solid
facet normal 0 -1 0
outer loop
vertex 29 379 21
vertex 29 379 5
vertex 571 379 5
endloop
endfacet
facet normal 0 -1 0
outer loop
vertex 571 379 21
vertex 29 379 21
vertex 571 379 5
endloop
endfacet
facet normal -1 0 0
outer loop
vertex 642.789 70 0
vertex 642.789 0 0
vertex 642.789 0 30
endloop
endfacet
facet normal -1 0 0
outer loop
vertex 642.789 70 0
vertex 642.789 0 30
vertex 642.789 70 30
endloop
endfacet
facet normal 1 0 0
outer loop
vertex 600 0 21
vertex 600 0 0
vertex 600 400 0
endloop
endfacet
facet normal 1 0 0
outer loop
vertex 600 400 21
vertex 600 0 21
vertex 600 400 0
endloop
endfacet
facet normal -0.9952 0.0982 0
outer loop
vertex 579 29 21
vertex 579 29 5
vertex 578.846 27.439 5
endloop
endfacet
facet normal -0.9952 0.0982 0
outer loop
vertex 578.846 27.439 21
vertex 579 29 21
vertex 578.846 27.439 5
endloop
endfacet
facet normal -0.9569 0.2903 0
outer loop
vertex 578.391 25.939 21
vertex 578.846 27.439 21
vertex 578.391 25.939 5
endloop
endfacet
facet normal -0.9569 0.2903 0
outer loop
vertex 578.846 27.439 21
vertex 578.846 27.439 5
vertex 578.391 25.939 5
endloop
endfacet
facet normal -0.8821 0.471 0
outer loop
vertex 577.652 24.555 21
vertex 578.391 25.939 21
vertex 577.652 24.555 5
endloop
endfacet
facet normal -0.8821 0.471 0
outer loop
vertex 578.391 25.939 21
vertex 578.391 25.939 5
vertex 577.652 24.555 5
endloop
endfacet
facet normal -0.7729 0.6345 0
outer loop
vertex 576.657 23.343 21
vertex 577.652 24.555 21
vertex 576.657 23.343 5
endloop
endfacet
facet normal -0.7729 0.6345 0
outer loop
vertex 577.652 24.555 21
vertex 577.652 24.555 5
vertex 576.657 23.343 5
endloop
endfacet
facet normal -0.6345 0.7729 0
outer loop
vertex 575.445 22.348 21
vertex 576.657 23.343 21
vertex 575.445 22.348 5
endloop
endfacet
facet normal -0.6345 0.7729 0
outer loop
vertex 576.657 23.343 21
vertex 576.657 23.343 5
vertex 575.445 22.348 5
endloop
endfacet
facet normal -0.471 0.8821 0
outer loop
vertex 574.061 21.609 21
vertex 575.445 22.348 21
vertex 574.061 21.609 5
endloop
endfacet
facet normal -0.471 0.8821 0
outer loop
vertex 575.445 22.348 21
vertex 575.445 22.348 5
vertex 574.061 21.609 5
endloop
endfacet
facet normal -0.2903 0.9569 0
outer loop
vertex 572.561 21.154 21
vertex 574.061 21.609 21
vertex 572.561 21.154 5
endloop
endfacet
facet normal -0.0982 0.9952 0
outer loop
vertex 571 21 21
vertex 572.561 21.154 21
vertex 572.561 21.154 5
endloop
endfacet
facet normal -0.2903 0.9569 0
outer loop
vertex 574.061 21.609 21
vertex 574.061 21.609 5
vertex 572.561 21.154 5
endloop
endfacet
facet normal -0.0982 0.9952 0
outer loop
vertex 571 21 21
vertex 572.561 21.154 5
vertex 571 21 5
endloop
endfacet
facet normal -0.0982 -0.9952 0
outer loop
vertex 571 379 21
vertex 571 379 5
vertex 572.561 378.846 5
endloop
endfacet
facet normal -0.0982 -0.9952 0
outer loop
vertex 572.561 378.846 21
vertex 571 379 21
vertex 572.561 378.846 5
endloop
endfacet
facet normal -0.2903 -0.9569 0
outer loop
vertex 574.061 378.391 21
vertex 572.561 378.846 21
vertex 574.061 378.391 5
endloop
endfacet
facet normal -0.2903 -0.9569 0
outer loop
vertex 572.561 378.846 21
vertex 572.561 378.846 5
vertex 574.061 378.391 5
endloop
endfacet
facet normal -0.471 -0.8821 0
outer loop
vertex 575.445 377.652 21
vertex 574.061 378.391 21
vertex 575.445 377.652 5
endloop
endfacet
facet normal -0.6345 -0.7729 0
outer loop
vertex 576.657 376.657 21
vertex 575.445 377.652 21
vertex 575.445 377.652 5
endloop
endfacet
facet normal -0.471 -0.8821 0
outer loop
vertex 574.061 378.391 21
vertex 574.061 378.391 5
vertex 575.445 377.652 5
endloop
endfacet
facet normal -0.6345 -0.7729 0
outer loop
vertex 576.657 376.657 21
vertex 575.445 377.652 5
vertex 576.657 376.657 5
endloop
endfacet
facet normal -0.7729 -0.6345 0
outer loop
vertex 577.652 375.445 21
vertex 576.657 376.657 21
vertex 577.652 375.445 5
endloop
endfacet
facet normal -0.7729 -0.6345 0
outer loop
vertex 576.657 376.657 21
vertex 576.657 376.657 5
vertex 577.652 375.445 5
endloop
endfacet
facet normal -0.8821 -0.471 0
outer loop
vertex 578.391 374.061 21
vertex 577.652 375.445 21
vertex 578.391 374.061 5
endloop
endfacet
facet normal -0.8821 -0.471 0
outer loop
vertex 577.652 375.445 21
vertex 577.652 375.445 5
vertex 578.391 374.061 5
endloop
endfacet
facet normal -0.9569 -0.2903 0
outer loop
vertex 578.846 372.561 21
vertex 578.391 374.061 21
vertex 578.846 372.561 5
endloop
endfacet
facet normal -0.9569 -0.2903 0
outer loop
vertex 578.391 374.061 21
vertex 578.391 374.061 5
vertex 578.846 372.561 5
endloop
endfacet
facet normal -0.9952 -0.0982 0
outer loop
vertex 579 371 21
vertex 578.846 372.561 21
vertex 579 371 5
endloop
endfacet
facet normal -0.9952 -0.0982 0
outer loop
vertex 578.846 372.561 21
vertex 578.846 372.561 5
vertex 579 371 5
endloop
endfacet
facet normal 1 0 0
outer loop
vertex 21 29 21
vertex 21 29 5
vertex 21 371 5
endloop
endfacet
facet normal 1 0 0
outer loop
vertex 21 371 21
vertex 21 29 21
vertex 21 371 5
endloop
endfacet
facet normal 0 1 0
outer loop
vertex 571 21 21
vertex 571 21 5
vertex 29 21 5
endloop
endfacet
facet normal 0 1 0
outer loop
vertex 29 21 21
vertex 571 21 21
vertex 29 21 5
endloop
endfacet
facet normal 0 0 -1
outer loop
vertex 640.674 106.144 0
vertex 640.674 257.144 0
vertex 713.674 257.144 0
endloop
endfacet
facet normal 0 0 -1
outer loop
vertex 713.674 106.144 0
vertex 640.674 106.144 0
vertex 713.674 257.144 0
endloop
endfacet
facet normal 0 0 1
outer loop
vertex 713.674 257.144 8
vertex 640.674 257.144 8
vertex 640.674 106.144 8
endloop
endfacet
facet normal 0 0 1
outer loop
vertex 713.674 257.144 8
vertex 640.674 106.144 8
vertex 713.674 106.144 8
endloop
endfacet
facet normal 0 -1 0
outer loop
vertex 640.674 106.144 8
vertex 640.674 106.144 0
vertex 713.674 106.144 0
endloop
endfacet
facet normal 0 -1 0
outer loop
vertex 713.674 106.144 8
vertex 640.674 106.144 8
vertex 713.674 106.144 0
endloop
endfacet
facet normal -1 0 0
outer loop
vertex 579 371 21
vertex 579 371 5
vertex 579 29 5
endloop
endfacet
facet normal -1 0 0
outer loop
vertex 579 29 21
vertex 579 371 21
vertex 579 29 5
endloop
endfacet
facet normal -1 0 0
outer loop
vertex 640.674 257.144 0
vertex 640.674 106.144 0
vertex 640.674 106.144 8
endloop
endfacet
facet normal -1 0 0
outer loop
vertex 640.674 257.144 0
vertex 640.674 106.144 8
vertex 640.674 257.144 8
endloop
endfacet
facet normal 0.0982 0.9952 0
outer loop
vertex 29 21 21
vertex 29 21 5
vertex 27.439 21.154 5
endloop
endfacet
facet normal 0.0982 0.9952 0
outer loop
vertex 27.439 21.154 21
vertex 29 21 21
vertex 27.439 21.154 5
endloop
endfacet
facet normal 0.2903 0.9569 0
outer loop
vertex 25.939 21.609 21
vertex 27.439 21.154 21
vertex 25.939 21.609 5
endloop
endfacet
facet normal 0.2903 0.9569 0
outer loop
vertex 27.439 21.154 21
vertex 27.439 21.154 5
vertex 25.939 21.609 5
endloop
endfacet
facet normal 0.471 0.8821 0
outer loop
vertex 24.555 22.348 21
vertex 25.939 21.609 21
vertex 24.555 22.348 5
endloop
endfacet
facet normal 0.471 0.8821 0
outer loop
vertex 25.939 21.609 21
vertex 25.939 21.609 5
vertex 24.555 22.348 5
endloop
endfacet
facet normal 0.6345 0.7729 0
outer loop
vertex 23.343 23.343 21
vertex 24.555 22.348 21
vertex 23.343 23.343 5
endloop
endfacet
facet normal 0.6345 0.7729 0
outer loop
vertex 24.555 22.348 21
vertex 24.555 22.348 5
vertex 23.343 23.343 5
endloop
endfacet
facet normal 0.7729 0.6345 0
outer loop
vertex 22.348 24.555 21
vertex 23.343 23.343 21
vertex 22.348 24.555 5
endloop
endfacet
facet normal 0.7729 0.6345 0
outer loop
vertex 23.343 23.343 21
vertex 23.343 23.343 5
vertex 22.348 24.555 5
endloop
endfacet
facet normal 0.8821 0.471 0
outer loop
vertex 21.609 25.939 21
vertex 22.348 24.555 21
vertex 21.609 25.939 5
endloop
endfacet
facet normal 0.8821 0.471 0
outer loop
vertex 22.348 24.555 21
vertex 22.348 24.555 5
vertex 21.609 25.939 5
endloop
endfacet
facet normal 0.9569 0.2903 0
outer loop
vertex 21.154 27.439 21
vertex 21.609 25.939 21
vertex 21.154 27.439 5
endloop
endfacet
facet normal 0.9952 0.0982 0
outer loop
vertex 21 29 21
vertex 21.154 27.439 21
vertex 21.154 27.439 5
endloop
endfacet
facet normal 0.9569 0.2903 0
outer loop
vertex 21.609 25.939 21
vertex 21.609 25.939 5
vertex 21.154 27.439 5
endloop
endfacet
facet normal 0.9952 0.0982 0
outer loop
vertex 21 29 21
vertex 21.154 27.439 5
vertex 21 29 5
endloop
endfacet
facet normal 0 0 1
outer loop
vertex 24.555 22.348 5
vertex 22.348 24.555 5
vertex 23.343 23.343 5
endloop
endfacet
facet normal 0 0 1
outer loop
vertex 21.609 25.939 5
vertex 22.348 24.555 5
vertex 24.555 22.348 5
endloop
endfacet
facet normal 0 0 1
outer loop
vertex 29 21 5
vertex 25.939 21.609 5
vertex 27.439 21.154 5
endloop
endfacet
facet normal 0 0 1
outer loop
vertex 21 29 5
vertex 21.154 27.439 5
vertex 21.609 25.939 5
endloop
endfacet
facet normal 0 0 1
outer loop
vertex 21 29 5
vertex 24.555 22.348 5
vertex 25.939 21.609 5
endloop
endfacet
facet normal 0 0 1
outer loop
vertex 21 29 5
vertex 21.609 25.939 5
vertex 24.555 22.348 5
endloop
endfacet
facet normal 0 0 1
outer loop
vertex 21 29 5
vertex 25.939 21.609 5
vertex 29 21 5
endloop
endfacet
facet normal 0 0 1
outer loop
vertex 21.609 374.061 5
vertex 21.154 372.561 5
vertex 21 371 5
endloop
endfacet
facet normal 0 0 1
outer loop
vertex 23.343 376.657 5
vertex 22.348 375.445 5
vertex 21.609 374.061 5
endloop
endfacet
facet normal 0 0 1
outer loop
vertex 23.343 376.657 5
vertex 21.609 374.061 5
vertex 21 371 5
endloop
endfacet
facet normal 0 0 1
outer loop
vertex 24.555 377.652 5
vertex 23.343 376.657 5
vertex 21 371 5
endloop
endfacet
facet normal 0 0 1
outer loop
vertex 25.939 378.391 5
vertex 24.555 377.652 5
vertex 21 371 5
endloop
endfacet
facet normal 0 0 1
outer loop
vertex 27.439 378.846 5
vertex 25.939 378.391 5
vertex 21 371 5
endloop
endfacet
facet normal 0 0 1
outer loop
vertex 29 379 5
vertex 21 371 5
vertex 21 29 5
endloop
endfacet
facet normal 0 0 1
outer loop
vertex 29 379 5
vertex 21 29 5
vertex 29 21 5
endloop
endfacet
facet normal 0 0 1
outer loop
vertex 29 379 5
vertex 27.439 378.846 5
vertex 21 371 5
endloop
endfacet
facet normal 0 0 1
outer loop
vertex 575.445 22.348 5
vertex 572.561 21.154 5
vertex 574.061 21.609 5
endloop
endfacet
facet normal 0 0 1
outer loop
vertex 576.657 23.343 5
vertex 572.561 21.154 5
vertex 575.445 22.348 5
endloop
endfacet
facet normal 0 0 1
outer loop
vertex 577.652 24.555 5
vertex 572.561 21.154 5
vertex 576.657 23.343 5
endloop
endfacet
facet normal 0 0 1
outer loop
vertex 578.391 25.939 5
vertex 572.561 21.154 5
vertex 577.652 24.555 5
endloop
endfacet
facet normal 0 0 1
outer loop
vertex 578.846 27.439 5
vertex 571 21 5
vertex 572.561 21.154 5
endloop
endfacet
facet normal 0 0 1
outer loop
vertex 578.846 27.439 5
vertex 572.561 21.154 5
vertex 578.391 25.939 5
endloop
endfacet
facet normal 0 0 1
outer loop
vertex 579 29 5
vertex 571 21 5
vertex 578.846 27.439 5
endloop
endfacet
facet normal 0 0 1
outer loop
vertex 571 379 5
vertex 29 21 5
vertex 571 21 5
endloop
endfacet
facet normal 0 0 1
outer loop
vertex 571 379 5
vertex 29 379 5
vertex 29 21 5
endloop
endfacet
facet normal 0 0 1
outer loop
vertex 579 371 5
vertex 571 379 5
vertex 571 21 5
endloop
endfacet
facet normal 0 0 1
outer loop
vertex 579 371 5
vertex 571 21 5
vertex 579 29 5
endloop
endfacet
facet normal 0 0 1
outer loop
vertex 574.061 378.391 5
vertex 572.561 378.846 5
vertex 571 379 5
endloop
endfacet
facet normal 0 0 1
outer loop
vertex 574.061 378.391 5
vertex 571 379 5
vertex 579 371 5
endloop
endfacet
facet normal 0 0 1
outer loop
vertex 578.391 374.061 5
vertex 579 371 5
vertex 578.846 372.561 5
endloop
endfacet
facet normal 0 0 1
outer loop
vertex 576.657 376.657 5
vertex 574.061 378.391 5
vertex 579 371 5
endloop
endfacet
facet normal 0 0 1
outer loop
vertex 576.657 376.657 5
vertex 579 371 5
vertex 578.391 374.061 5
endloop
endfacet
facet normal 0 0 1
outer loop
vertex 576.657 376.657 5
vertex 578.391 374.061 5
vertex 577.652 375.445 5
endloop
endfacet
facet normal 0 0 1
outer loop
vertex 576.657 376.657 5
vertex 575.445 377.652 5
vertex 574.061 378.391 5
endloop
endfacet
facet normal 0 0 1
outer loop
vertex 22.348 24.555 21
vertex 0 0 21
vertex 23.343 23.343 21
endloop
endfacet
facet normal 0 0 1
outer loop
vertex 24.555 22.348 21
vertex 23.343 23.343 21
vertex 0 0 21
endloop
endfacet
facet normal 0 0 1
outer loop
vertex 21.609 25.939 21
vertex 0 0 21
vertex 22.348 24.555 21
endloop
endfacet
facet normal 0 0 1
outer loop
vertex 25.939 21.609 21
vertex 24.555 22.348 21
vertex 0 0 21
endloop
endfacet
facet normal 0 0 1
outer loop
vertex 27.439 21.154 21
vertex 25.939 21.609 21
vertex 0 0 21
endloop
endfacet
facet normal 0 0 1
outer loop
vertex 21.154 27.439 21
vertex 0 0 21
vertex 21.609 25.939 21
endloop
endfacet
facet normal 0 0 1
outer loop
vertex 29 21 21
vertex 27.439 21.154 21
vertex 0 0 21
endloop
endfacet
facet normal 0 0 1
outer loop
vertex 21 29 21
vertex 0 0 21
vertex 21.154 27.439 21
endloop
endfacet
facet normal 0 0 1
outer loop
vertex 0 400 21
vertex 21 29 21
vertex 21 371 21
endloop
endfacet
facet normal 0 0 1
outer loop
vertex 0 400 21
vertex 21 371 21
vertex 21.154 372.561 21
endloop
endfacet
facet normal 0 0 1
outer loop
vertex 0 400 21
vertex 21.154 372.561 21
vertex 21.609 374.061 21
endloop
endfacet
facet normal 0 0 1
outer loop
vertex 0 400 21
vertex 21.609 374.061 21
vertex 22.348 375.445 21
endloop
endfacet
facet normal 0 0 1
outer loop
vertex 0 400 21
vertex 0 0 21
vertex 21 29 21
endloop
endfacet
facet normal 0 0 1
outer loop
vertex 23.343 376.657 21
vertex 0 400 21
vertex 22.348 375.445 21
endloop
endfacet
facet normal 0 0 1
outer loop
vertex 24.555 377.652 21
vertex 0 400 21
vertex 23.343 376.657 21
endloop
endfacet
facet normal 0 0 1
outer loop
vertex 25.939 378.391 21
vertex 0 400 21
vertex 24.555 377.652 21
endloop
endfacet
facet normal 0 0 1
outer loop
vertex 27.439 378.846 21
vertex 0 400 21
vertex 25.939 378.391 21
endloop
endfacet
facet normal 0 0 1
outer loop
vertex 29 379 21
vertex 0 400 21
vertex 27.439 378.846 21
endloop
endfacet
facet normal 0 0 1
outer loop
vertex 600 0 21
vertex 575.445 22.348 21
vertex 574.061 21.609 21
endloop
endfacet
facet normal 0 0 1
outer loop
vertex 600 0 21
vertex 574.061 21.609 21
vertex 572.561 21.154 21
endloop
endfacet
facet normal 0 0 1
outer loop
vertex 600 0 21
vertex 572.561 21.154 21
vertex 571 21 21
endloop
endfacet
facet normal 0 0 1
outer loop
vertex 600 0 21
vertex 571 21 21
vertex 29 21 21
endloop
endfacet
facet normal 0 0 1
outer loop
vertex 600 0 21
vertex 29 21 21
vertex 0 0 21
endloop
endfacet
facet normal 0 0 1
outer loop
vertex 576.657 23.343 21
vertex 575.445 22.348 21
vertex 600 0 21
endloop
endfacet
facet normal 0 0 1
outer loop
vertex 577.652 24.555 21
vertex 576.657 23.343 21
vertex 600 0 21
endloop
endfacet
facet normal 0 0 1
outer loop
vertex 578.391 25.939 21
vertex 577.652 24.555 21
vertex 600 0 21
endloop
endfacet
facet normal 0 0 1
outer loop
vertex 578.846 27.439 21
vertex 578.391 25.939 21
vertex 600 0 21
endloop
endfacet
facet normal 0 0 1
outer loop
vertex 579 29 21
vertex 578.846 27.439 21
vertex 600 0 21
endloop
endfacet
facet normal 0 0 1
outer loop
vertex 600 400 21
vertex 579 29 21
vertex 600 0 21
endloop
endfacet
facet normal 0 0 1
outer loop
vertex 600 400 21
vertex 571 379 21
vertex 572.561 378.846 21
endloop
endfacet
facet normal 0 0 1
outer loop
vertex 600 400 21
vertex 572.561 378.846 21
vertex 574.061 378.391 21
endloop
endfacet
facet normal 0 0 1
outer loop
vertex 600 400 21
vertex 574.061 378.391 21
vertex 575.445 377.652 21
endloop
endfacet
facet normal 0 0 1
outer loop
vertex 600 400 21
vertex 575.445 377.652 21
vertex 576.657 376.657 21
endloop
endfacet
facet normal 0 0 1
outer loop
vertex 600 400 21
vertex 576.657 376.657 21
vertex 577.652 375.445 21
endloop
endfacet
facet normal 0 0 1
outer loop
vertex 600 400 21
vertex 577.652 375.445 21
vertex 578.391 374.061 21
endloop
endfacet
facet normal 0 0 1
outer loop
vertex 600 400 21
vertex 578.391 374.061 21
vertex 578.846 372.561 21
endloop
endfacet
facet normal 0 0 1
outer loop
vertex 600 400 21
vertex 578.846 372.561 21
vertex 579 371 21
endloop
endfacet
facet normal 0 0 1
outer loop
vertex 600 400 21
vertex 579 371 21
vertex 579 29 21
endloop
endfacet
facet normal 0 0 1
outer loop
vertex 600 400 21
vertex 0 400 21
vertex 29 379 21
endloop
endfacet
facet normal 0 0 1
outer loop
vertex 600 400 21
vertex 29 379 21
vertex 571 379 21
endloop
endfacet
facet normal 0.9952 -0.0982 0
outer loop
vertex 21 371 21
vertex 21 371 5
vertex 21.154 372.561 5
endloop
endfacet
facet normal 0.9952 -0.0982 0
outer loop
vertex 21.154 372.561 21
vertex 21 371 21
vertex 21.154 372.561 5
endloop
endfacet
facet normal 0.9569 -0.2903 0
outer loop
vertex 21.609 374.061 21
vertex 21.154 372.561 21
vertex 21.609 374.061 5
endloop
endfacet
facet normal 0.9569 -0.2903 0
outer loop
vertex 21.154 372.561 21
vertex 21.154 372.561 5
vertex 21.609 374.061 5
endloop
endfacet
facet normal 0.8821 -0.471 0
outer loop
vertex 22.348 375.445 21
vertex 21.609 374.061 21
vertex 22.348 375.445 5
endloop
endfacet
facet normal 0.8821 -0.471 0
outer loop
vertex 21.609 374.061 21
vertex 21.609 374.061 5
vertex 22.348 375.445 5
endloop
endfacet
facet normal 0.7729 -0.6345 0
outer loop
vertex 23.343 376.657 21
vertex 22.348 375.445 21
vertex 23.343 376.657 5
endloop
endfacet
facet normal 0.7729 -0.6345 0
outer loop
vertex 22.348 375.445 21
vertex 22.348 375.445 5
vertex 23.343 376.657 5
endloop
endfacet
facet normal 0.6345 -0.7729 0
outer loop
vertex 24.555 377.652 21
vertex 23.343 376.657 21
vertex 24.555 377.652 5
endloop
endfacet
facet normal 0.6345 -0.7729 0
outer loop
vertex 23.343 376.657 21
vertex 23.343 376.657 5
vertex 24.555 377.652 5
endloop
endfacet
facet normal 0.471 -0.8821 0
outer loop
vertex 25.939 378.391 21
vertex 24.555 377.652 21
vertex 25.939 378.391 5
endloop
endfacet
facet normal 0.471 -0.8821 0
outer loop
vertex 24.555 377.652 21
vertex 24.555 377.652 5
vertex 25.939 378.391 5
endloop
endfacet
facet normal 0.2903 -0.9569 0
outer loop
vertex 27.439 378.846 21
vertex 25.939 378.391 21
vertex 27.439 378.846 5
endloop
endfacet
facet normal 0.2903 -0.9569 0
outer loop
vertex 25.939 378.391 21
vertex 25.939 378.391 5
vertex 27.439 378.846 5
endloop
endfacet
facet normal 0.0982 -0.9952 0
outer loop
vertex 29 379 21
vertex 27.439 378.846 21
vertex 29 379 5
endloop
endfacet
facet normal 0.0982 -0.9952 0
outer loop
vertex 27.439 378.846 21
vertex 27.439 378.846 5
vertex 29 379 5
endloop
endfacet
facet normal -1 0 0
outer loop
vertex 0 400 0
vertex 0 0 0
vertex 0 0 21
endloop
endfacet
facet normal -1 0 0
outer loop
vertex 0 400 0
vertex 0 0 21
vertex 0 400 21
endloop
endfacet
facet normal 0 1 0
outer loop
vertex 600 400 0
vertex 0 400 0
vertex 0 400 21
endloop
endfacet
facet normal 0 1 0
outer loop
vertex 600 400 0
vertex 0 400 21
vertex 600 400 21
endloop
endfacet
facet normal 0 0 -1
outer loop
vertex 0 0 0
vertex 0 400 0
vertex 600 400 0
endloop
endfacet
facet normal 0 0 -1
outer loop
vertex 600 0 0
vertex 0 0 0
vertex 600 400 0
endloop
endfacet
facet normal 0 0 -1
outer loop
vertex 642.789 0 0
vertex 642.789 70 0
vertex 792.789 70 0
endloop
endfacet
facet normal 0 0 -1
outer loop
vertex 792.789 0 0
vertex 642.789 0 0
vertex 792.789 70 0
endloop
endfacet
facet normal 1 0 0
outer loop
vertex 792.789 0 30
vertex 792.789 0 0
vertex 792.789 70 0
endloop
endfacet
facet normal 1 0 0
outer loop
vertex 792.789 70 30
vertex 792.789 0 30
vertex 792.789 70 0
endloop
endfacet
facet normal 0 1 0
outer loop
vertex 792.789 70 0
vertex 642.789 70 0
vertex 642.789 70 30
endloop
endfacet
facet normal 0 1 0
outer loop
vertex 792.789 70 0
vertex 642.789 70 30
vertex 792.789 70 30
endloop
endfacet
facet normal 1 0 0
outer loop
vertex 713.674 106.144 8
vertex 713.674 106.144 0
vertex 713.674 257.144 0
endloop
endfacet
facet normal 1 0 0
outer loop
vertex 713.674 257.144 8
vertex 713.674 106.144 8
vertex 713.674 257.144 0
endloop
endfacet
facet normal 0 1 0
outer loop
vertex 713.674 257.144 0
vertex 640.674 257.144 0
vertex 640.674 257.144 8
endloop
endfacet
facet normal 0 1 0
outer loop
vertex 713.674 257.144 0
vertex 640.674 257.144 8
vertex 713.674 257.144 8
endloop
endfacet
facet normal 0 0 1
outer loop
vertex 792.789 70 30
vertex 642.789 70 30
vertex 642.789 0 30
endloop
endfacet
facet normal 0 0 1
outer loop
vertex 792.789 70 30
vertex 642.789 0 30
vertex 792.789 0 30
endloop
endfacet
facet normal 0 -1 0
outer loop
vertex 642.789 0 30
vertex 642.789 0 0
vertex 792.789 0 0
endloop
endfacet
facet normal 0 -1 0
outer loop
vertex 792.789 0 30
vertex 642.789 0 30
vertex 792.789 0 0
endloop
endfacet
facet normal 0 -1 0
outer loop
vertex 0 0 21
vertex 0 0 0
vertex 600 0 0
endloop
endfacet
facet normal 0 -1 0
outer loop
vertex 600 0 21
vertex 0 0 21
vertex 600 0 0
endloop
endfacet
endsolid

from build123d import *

# Parameters (mm, degrees)
F1_W     = 600
F1_H     = 400
F2_DEPTH = 21
F3_DEPTH = 5
F1_W_2   = 150
F1_H_2   = 70
F4_DEPTH = 30
F1_W_3   = 73
F1_H_3   = 151
F5_DEPTH = 8


with BuildPart() as f2:
    # F1 (on Top) → F2 (new body)
    with BuildSketch(Plane.XY):
        with Locations((300, 200)):
            Rectangle(F1_W, F1_H)
        with BuildLine():
            ThreePointArc((21, 371), (23.3431457505, 376.6568542495), (29, 379))
            Line((29, 379), (571, 379))
            ThreePointArc((571, 379), (576.6568542495, 376.6568542495), (579, 371))
            Line((579, 371), (579, 29))
            ThreePointArc((579, 29), (576.6568542495, 23.3431457505), (571, 21))
            Line((571, 21), (29, 21))
            ThreePointArc((29, 21), (23.3431457505, 23.3431457505), (21, 29))
            Line((21, 29), (21, 371))
        make_face(mode=Mode.SUBTRACT)
    extrude(amount=F2_DEPTH)

    # F1 (on Top) → F3 (join)
    with BuildSketch(Plane.XY):
        with BuildLine():
            Line((571, 379), (29, 379))
            ThreePointArc((29, 379), (23.3431457505, 376.6568542495), (21, 371))
            Line((21, 371), (21, 29))
            ThreePointArc((21, 29), (23.3431457505, 23.3431457505), (29, 21))
            Line((29, 21), (571, 21))
            ThreePointArc((571, 21), (576.6568542495, 23.3431457505), (579, 29))
            Line((579, 29), (579, 371))
            ThreePointArc((579, 371), (576.6568542495, 376.6568542495), (571, 379))
        make_face()
    extrude(amount=F3_DEPTH)


with BuildPart() as f4:
    # F1 (on Top) → F4 (new body)
    with BuildSketch(Plane.XY):
        with Locations((717.7889823914, 35)):
            Rectangle(F1_W_2, F1_H_2)
    extrude(amount=F4_DEPTH)


with BuildPart() as f5:
    # F1 (on Top) → F5 (new body)
    with BuildSketch(Plane.XY):
        with Locations((677.1741738319, 181.6440706253)):
            Rectangle(F1_W_3, F1_H_3)
    extrude(amount=F5_DEPTH)


solid = Compound([f2.part, f4.part, f5.part])
